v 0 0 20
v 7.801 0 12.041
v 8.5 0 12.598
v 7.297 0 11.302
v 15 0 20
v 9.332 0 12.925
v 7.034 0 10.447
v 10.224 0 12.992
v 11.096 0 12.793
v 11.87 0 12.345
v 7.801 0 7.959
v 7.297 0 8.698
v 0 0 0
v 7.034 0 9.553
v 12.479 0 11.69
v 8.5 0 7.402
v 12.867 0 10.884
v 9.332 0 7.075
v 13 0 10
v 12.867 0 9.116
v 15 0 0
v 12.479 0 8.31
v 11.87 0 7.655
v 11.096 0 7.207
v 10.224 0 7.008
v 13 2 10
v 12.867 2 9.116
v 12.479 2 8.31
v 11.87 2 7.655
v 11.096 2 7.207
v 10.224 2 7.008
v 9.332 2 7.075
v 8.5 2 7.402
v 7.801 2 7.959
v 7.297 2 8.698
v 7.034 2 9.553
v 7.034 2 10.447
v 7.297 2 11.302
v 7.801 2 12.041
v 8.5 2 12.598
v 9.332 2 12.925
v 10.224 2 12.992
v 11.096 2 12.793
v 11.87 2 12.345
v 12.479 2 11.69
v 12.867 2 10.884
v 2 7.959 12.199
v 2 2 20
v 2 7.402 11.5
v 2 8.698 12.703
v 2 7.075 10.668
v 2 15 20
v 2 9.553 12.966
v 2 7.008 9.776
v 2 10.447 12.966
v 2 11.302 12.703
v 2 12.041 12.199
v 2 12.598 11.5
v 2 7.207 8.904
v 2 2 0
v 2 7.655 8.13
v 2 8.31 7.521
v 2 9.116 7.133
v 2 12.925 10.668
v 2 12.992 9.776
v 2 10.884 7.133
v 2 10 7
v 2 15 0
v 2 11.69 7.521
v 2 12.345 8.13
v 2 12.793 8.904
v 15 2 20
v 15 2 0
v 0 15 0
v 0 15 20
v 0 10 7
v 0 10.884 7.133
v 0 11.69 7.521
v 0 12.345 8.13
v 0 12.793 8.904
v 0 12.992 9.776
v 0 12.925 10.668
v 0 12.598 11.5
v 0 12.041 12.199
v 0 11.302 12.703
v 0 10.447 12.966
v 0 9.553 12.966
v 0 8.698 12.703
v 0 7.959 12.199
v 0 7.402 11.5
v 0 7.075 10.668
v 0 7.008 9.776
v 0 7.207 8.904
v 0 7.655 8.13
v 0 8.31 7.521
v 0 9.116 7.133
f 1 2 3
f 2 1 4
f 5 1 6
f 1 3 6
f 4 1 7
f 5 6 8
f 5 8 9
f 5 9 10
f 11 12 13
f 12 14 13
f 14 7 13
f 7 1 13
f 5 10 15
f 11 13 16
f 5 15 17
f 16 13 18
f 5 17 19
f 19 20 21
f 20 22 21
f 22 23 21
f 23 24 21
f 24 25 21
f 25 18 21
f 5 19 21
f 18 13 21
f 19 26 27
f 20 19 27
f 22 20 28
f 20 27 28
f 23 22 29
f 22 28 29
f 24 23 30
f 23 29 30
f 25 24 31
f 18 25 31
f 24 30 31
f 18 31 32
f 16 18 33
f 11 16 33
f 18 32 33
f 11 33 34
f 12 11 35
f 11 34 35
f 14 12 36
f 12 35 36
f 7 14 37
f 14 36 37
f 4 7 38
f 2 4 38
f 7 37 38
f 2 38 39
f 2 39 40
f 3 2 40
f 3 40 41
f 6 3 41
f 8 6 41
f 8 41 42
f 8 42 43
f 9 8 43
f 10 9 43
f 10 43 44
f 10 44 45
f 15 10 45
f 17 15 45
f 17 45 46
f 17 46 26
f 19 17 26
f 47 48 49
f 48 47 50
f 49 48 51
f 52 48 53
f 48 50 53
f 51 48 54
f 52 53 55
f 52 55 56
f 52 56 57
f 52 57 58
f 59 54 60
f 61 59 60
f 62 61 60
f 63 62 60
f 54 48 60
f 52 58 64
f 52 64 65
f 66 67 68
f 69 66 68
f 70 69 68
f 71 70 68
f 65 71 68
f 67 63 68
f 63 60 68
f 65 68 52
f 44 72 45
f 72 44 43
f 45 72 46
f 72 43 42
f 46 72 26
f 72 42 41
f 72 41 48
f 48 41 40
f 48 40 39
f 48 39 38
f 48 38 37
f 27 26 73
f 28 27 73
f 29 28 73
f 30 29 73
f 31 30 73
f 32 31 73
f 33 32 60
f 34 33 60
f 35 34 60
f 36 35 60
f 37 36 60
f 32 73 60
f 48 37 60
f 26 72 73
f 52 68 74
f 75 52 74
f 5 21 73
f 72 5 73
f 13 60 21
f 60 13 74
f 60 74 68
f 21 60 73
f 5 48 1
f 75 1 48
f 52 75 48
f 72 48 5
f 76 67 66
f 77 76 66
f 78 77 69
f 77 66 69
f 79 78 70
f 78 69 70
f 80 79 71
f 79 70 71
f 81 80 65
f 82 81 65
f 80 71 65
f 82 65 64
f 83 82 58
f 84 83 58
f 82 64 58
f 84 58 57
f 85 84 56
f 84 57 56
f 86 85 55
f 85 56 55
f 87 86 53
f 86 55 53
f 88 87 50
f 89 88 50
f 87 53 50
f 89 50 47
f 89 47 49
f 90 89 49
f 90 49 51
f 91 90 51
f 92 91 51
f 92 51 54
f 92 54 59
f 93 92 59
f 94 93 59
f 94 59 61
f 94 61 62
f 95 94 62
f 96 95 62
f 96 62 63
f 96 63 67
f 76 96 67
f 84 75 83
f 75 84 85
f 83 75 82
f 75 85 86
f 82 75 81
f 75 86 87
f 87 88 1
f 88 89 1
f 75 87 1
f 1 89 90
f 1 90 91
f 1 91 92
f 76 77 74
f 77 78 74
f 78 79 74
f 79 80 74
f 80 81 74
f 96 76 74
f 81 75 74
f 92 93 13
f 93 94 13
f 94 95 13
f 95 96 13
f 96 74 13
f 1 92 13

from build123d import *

# Parameters (mm, degrees)
BOSS_EXTRUDE1_DEPTH = 20
CUT_EXTRUDE1_REACH  = 4
SKETCH2_R           = 3
SKETCH3_R           = 3
CUT_EXTRUDE2_DEPTH  = 20


with BuildPart() as part:
    # Sketch1 → Boss-Extrude1 (new body)
    with BuildSketch(Plane.XY):
        Polygon((0, 0), (15, 0), (15, 2), (2, 2), (2, 15), (0, 15), align=None)
    extrude(amount=BOSS_EXTRUDE1_DEPTH)

    # Sketch2 → Cut-Extrude1 (cut, up to next)
    with BuildSketch(Plane(origin=(0, 2, 0), x_dir=(1, 0, 0), z_dir=(0, 1, 0)), mode=Mode.PRIVATE) as cut_extrude1_sk1:
        with Locations((10, -10)):
            Circle(SKETCH2_R)
    cut_extrude1_tool1 = extrude(cut_extrude1_sk1.sketch, amount=-CUT_EXTRUDE1_REACH, mode=Mode.PRIVATE) & part.part
    add(cut_extrude1_tool1.solids().sort_by_distance((10, 2, 10))[0], mode=Mode.SUBTRACT)

    # Sketch3 → Cut-Extrude2 (cut)
    with BuildSketch(Plane(origin=(2, 0, 0), x_dir=(0, 0, -1), z_dir=(1, 0, 0))):
        with Locations((-10, 10)):
            Circle(SKETCH3_R)
    extrude(amount=-CUT_EXTRUDE2_DEPTH, mode=Mode.SUBTRACT)


solid = part.part
